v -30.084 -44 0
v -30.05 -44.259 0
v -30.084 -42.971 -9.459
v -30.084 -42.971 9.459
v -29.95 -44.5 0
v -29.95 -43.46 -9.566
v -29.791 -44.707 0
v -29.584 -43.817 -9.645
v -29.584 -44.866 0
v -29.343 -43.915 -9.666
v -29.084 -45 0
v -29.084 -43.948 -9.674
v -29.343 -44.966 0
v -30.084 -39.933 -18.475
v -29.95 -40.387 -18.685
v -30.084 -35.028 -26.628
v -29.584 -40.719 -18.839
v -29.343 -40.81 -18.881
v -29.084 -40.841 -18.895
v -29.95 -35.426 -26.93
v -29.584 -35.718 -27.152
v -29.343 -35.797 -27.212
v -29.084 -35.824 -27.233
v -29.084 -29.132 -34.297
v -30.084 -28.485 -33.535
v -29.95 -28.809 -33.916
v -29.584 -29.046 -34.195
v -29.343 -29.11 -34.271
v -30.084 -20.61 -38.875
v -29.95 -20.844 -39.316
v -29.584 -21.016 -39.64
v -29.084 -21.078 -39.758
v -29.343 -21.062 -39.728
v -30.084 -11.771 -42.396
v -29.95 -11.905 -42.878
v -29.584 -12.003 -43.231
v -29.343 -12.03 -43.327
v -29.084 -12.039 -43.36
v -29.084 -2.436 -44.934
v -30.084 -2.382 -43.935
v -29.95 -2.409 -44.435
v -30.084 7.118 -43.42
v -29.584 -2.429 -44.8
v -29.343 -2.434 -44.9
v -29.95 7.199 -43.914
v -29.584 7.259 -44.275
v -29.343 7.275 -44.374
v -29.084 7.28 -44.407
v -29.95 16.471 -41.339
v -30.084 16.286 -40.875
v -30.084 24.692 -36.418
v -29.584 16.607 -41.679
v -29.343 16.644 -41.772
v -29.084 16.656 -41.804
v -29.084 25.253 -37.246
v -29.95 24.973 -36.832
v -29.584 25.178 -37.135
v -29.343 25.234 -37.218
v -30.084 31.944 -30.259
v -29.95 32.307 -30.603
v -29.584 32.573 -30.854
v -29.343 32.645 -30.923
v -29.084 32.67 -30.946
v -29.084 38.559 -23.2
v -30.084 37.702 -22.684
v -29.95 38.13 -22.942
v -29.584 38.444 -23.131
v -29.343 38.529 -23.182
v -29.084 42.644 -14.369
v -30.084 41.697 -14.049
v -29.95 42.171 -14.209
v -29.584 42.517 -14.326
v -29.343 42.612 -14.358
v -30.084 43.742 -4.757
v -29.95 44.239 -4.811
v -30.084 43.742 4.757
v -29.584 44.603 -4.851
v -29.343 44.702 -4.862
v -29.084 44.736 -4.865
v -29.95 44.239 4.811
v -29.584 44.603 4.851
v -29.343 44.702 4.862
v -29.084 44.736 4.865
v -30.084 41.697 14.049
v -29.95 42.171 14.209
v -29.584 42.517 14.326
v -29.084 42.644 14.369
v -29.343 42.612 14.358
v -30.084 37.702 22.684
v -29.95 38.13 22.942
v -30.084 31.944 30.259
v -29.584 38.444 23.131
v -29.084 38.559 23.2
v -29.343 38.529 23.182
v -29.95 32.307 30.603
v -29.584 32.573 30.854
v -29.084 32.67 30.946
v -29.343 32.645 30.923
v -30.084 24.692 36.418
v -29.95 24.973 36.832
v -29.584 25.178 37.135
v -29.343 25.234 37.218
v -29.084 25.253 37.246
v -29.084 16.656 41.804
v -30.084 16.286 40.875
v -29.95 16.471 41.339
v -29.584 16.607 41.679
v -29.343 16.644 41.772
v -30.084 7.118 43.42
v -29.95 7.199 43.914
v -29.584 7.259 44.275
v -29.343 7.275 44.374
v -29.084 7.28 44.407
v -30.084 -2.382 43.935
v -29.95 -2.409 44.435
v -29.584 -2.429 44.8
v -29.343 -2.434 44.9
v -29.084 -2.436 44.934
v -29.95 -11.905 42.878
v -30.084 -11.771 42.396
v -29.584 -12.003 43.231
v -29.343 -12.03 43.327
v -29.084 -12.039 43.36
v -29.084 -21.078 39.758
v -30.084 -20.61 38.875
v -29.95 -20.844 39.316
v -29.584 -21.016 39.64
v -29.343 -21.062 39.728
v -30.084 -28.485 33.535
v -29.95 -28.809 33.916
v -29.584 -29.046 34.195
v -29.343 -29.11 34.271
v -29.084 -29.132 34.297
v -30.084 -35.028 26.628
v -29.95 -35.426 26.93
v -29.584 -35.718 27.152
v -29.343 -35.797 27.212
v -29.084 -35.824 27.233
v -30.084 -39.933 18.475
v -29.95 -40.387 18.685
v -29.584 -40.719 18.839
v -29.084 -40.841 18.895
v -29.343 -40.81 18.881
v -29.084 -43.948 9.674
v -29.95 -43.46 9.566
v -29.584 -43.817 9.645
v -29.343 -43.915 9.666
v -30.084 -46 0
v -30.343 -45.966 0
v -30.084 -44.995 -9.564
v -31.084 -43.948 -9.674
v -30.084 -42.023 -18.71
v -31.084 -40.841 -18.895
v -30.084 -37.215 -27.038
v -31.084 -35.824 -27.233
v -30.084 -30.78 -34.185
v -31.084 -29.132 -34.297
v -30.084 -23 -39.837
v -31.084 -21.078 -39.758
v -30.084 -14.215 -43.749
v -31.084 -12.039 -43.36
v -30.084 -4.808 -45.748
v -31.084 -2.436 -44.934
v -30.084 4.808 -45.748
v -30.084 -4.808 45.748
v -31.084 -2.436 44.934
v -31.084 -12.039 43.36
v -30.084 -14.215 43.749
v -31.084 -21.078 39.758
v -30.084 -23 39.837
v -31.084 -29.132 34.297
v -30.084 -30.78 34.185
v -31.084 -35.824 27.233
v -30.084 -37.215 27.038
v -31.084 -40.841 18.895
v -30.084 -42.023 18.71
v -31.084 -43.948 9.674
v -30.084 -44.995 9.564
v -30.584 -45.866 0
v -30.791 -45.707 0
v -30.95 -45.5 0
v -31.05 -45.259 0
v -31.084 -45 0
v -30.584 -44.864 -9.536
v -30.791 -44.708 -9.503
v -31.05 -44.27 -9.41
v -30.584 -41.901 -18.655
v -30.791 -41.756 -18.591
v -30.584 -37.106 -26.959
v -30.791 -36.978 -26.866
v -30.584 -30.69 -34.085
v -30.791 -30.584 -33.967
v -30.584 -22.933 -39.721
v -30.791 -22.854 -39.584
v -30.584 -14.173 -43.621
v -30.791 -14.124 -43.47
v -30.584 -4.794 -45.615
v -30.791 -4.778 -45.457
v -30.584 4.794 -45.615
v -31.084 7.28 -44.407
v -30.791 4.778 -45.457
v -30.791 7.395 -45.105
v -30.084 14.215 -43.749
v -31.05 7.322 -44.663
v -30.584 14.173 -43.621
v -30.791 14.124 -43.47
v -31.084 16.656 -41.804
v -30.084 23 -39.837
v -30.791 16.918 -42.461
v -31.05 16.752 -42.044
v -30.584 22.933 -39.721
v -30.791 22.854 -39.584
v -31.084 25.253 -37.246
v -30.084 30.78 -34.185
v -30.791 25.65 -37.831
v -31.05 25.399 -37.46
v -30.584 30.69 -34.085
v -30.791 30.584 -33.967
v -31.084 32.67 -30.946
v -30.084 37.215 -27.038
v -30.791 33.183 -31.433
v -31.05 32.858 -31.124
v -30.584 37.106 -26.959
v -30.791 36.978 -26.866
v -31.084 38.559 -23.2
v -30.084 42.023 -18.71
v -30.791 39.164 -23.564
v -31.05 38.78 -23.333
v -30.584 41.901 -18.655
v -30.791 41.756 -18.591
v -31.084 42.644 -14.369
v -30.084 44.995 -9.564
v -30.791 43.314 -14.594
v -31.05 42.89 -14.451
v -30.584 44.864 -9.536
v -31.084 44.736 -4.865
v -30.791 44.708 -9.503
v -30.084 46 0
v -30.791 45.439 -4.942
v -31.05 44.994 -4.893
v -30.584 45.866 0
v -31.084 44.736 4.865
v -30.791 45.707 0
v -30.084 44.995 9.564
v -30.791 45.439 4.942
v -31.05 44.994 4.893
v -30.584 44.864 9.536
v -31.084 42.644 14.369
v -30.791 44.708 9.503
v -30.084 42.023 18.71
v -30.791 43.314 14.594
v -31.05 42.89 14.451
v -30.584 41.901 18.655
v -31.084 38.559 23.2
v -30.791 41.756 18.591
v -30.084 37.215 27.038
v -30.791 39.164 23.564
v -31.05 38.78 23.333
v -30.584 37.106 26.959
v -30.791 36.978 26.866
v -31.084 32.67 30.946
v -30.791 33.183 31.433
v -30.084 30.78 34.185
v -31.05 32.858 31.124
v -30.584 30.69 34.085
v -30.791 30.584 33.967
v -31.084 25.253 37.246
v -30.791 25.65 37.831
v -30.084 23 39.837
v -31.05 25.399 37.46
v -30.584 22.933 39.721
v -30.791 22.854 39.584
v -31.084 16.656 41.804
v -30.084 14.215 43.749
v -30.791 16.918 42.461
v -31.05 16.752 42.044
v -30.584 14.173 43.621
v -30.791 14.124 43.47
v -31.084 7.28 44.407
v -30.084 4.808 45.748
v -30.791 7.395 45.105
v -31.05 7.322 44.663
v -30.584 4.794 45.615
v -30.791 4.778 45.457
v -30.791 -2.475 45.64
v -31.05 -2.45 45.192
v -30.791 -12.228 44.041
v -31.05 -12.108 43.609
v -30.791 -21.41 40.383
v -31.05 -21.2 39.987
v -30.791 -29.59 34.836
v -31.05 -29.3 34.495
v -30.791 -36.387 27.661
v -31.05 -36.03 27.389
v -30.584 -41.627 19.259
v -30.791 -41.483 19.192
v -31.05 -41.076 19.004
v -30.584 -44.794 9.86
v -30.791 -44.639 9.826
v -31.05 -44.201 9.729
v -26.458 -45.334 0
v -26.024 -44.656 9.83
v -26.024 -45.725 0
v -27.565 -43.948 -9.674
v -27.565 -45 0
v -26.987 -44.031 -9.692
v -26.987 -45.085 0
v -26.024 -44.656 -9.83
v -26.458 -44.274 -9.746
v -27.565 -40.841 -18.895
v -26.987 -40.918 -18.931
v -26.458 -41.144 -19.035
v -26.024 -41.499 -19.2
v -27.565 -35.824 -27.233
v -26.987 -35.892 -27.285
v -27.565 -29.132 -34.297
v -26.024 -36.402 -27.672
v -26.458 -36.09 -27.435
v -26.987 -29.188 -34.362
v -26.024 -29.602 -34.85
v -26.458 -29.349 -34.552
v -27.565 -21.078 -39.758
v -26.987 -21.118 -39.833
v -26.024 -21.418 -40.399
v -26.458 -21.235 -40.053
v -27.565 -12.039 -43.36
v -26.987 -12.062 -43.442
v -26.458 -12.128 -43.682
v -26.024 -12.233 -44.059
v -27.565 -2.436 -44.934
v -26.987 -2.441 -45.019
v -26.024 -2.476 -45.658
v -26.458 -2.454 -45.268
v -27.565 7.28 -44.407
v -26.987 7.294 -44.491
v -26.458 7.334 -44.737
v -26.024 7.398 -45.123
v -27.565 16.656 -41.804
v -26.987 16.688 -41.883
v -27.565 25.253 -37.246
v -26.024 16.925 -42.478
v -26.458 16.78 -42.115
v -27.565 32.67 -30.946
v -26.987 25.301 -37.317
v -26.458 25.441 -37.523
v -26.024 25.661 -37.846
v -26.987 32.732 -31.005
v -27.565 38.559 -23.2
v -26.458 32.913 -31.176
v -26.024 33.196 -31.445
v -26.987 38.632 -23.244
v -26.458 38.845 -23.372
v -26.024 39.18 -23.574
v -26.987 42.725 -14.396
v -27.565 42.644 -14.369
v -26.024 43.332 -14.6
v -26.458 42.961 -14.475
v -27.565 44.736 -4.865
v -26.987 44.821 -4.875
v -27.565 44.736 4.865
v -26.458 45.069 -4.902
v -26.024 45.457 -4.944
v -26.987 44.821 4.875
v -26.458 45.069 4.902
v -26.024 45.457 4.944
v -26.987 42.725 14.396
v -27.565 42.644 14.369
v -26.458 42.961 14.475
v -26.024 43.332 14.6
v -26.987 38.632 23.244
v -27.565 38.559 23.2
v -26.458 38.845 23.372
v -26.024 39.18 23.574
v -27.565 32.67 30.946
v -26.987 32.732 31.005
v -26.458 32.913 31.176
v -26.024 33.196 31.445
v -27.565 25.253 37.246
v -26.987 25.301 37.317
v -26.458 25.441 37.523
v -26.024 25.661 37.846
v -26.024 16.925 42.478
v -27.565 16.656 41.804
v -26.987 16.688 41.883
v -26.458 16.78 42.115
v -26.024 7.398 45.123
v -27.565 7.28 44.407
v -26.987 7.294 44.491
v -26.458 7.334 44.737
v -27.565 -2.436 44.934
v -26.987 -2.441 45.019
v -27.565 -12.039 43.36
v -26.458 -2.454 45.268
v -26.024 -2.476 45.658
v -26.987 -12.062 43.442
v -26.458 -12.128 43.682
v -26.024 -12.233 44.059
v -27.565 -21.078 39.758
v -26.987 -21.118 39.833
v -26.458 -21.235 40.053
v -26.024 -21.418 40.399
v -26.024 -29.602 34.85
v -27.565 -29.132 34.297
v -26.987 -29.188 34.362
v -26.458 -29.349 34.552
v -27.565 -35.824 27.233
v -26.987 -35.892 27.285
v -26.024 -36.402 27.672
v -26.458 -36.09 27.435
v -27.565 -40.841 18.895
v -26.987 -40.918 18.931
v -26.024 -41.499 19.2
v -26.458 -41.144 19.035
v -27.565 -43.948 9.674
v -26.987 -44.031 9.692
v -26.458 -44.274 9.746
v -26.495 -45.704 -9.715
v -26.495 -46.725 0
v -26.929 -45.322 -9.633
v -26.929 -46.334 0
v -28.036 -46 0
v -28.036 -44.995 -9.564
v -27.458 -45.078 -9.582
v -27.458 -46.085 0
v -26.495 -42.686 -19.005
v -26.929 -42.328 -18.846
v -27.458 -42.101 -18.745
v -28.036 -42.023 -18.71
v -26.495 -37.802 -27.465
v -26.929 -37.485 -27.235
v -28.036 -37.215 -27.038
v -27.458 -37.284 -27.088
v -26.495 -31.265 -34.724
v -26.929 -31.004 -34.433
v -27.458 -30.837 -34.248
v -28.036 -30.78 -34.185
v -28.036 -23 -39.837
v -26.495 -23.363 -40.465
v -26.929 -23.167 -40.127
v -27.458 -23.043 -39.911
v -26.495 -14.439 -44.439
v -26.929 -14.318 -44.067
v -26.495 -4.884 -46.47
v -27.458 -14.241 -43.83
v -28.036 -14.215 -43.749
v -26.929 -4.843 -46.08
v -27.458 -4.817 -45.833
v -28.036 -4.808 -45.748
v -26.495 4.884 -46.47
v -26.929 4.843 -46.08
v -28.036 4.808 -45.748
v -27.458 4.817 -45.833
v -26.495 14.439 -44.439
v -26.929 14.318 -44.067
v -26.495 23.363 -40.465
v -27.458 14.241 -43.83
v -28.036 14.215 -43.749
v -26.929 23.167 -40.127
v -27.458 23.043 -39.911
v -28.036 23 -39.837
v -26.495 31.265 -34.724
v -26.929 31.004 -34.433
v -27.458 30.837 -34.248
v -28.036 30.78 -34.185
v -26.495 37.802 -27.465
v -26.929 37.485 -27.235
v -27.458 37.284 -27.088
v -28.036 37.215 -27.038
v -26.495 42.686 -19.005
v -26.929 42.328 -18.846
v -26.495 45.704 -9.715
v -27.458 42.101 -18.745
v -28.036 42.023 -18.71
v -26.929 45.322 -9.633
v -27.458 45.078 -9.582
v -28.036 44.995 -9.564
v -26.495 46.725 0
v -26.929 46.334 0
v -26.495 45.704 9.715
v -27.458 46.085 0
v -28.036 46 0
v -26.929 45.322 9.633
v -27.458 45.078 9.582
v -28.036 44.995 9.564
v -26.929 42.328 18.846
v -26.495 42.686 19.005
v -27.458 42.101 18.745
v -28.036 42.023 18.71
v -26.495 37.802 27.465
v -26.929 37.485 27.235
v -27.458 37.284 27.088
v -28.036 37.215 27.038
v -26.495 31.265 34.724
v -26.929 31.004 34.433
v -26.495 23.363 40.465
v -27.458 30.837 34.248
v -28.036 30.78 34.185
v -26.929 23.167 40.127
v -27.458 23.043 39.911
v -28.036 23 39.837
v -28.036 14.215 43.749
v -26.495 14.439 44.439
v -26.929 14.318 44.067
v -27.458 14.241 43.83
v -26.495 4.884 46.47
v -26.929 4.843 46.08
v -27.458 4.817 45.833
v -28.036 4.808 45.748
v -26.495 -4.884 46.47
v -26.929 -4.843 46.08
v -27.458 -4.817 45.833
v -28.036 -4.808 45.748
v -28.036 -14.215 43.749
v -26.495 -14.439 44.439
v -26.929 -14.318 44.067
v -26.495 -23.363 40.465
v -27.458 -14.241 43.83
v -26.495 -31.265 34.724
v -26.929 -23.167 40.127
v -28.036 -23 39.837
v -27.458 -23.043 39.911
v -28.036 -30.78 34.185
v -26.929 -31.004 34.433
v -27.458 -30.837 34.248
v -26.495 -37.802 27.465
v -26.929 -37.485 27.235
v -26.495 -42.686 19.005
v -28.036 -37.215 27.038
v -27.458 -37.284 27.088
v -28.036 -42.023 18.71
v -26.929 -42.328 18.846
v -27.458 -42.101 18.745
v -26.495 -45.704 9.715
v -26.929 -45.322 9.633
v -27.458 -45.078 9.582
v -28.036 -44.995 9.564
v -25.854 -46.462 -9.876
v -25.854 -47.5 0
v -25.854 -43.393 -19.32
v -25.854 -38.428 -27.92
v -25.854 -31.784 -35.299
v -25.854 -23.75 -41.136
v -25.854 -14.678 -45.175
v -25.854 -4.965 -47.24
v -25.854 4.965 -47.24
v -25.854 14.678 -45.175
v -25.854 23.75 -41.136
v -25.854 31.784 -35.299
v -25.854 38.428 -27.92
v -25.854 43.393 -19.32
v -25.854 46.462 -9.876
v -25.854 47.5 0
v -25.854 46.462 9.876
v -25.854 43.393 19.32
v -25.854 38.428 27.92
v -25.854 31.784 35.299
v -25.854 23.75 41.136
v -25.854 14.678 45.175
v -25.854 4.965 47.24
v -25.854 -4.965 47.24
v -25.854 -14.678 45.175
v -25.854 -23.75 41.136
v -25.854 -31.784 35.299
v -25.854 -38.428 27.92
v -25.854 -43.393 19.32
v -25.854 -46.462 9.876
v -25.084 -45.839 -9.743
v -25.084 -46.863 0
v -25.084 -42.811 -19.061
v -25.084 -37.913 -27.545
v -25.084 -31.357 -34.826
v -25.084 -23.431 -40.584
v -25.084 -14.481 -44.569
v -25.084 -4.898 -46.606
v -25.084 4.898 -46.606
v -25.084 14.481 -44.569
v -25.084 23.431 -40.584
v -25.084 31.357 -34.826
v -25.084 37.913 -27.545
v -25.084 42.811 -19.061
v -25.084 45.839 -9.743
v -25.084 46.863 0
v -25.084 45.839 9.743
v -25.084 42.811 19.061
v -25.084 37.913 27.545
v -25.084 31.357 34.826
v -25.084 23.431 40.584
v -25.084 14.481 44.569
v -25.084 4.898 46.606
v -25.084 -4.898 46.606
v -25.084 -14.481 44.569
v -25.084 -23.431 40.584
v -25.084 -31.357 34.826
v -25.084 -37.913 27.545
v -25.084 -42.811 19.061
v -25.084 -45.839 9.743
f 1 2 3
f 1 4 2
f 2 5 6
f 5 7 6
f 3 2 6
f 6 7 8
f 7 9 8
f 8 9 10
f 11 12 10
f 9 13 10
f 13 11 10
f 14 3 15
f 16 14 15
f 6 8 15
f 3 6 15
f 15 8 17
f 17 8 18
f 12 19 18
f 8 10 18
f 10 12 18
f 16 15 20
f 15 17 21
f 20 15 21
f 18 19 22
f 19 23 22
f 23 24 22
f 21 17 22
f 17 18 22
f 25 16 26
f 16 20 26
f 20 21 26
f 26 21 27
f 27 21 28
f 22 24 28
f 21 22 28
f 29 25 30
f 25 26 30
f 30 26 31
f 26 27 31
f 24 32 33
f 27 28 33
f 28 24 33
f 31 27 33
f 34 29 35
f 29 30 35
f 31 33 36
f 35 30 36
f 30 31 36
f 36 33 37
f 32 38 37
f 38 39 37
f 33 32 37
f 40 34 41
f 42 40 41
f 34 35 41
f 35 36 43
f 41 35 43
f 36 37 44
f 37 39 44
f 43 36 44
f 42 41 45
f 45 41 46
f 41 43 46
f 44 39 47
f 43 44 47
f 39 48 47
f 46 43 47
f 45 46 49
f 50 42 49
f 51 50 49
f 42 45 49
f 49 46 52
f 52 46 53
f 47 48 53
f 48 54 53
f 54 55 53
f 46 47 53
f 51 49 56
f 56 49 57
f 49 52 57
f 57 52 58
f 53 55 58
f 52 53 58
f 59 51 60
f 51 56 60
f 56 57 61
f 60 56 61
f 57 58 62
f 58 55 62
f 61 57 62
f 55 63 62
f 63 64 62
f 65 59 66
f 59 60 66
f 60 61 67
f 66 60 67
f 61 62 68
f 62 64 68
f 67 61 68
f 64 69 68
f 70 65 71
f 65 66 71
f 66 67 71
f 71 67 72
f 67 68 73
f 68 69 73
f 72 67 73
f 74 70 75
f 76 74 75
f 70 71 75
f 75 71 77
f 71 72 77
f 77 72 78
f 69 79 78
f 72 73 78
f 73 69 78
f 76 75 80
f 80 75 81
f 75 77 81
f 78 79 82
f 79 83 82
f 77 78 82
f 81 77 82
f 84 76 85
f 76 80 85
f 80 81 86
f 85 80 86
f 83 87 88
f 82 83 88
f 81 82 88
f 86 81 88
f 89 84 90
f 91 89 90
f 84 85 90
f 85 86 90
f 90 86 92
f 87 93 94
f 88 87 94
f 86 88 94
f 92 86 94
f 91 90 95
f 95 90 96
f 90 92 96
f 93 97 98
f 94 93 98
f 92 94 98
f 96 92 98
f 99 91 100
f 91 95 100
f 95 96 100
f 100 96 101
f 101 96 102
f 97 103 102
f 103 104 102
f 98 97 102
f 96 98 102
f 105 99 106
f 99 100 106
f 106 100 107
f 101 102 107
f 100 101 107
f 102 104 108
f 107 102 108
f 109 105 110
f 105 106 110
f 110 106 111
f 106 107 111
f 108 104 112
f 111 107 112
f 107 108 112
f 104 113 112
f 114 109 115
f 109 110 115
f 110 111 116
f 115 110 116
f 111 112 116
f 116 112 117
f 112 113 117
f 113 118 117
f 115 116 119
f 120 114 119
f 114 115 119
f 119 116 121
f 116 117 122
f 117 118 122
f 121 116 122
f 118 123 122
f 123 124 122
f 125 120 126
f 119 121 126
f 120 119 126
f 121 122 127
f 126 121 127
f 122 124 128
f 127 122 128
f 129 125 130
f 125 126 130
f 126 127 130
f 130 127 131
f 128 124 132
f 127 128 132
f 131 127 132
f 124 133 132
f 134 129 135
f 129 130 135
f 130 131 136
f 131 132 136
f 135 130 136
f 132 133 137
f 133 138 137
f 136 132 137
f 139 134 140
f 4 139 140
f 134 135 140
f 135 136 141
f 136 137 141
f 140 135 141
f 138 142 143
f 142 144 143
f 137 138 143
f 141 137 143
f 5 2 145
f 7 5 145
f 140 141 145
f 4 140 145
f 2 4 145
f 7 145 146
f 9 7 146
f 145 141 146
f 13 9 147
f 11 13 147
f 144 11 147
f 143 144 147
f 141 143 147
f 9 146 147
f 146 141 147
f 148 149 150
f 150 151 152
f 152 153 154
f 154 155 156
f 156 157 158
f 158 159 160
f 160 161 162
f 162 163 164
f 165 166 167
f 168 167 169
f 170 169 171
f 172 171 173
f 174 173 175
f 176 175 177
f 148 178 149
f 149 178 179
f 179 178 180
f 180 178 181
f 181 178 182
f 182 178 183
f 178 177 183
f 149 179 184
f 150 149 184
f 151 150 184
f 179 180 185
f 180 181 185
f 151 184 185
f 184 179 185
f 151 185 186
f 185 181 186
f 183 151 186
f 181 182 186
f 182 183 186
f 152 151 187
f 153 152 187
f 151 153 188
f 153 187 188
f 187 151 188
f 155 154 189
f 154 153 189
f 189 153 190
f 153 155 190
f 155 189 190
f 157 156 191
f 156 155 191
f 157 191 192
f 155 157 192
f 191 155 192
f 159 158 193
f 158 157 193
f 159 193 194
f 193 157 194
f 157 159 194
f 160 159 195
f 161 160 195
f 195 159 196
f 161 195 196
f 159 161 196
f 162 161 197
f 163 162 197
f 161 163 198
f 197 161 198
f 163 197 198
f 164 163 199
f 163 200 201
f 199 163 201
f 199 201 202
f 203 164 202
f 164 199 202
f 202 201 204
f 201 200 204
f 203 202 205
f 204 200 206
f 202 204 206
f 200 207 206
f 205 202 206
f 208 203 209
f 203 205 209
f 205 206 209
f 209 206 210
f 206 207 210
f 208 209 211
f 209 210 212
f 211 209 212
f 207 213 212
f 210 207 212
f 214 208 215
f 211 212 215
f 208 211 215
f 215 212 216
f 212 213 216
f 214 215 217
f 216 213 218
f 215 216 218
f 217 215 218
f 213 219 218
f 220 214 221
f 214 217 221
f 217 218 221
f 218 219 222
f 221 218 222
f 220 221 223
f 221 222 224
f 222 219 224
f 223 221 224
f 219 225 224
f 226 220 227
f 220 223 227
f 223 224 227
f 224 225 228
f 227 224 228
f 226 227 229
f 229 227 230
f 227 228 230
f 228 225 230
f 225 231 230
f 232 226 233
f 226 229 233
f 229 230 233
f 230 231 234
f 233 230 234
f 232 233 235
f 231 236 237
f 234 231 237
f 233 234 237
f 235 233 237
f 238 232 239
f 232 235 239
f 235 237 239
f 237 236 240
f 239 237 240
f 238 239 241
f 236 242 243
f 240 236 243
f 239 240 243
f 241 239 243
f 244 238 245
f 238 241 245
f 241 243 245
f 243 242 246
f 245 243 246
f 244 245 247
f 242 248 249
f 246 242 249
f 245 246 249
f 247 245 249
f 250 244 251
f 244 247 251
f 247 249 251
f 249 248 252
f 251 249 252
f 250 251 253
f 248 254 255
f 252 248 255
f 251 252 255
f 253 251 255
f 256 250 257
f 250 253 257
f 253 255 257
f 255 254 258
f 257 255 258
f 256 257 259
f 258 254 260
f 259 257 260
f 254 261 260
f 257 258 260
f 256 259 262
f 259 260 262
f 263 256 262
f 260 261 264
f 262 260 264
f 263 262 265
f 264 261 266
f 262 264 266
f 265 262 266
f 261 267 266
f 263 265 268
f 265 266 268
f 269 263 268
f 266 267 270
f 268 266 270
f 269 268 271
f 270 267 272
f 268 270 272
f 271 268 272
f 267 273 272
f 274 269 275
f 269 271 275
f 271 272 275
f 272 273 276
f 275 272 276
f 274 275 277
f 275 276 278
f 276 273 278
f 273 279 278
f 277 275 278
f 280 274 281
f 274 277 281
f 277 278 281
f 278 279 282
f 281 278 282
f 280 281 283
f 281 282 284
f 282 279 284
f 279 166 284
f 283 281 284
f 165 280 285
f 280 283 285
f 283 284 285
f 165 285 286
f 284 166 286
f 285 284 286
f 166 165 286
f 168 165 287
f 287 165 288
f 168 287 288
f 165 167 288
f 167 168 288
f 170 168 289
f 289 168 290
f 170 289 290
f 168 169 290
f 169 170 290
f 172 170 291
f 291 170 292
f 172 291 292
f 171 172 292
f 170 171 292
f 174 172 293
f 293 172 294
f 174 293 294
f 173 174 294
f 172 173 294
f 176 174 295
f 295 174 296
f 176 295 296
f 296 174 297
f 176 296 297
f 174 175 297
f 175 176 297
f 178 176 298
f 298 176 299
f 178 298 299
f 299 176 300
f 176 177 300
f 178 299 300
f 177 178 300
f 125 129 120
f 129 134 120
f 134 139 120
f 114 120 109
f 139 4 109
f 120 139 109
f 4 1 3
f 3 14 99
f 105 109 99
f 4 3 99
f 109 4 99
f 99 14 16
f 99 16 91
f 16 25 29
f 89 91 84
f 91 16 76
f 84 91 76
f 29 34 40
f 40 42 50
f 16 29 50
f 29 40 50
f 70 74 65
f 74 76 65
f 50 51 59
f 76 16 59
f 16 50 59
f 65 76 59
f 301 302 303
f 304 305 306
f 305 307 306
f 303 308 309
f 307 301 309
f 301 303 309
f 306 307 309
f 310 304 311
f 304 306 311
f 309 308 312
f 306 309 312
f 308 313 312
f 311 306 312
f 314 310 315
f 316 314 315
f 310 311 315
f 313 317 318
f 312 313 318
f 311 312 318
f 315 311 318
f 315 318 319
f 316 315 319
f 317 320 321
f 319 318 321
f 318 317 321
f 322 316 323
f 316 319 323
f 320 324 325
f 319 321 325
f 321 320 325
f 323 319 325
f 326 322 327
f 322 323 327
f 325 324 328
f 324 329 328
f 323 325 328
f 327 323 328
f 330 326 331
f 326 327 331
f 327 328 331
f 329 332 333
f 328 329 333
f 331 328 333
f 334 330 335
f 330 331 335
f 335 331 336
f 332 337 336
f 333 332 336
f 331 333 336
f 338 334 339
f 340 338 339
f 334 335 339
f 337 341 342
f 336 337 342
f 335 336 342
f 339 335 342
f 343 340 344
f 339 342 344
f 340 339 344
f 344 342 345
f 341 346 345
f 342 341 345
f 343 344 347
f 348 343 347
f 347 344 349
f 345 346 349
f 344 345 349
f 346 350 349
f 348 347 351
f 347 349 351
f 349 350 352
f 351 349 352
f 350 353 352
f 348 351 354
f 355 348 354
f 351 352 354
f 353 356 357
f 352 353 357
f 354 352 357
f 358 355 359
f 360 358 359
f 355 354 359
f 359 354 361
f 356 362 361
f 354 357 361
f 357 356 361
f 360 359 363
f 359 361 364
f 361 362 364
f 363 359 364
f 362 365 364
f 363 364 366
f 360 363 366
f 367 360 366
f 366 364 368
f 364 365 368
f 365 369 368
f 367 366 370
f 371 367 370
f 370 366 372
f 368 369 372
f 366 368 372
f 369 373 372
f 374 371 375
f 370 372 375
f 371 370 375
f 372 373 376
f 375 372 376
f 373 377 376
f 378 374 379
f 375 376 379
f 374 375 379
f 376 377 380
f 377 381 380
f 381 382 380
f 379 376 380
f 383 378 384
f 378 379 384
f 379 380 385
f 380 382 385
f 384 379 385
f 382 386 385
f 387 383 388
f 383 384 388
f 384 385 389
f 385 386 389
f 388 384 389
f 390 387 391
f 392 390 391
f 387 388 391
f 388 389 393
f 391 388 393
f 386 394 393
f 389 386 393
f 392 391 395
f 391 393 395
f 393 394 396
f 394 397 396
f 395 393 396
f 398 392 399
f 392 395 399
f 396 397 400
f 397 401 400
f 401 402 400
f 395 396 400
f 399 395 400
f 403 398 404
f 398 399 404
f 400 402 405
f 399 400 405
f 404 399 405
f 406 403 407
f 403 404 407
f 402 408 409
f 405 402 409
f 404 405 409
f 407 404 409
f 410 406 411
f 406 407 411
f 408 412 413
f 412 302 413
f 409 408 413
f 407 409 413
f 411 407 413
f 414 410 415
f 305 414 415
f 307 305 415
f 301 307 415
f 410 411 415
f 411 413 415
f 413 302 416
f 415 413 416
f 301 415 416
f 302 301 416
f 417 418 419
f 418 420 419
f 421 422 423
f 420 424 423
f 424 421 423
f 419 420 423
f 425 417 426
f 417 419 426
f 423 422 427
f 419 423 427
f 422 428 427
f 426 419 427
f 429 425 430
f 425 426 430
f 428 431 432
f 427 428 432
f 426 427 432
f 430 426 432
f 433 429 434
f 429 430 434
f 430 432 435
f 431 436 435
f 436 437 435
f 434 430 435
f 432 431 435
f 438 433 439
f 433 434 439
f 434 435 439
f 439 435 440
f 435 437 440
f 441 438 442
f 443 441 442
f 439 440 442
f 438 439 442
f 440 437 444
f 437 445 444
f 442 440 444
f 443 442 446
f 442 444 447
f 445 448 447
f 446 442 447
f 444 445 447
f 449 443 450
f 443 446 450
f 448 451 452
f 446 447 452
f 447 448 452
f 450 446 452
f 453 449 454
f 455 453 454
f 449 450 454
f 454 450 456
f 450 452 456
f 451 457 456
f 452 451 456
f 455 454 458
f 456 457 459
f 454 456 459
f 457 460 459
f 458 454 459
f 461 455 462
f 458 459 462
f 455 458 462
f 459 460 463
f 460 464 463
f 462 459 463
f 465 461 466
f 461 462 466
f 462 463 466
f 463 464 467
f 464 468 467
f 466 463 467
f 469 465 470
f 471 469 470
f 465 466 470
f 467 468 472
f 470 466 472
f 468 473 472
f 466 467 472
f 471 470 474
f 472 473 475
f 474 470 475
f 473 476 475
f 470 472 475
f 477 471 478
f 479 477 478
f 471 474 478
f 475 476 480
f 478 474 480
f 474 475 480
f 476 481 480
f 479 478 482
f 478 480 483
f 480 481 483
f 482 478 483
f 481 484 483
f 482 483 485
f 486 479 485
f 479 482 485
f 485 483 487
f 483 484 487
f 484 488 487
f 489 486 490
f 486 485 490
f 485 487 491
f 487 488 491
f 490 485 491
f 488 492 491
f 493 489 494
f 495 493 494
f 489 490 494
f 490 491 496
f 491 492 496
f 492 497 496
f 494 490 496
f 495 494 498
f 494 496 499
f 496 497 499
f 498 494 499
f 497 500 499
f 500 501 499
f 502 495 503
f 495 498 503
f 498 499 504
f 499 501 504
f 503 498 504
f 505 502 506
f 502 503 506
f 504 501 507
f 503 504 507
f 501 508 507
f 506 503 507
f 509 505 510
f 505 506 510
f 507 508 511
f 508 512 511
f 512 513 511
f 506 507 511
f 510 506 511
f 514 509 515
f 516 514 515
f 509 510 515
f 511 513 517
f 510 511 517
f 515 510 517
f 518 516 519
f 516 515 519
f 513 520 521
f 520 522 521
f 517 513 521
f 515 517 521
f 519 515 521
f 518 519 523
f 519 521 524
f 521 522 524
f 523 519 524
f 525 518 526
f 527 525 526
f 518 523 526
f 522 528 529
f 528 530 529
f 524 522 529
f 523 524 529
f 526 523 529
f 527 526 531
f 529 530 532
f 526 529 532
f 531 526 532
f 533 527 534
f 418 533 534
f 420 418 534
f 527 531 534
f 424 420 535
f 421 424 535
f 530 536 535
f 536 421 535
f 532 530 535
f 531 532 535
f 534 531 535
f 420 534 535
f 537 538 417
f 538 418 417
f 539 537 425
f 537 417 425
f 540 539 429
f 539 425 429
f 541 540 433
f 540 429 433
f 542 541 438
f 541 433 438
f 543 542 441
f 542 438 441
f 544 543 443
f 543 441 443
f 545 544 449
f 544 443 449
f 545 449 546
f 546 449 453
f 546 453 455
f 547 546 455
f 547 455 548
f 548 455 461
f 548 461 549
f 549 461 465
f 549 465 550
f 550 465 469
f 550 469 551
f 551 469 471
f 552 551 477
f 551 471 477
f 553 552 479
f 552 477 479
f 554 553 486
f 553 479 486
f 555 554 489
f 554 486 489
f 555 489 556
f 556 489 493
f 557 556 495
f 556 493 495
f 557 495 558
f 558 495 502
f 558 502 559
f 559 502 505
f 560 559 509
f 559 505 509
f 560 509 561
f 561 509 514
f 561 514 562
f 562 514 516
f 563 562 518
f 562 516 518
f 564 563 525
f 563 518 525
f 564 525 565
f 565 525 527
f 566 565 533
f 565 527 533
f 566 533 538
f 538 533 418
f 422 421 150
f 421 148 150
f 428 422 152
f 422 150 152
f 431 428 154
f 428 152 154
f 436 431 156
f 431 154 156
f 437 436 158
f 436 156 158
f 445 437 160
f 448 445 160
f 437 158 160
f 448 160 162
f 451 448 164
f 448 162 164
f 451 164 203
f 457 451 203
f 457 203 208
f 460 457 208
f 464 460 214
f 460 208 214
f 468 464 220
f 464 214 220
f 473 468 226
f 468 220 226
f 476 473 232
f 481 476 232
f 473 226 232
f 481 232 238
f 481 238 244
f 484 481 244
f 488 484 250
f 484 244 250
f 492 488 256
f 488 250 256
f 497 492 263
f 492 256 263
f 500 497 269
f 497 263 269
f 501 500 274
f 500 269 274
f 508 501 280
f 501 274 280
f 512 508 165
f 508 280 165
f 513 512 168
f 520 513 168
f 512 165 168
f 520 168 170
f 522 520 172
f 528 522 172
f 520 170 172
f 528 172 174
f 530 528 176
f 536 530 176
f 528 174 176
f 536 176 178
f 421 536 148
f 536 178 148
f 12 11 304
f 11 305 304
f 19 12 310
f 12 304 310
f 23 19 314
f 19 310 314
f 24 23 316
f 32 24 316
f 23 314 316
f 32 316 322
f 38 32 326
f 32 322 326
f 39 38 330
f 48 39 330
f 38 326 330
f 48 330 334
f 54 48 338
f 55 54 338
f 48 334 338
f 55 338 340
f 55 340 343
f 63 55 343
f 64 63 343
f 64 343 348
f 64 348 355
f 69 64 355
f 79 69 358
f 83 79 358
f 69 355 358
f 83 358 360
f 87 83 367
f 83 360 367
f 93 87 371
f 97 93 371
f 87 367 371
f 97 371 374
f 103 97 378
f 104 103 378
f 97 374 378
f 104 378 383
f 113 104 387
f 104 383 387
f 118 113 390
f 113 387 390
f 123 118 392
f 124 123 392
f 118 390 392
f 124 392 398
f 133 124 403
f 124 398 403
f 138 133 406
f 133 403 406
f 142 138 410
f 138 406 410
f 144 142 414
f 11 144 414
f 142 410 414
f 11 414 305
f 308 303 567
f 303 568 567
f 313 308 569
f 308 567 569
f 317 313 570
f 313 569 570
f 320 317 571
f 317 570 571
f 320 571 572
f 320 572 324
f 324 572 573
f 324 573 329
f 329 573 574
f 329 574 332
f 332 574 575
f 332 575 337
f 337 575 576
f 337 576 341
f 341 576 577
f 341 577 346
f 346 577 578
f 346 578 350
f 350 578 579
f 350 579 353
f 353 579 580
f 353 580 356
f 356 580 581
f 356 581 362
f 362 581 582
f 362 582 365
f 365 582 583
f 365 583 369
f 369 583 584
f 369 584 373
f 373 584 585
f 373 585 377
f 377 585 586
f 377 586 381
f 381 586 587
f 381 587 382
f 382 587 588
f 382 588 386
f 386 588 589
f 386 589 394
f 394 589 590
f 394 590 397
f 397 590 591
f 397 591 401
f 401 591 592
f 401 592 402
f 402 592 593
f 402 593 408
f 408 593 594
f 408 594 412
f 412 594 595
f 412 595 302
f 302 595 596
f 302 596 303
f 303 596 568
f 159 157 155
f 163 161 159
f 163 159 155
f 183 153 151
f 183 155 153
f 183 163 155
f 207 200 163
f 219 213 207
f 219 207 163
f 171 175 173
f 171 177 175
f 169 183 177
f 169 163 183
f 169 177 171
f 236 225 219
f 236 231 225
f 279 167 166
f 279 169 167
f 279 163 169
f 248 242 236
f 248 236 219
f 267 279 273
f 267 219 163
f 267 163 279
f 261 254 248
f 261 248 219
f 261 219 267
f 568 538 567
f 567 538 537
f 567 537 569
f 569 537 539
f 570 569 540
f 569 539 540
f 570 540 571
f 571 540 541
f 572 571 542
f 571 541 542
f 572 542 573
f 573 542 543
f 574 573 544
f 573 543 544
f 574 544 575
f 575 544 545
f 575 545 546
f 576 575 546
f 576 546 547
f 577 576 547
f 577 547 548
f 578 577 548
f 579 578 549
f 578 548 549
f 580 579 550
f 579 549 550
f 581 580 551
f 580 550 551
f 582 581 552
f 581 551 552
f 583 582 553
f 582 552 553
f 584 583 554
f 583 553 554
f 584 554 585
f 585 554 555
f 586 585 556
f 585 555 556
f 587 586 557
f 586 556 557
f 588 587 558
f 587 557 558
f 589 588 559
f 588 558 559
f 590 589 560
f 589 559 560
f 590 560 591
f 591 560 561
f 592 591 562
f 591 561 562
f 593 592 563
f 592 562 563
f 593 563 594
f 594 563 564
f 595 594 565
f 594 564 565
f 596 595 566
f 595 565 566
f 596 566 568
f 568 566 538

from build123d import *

# Parameters (mm, degrees)
SKETCH_2_R          = 36.366400699
CUT_EXTRUDE_1_DEPTH = 16
SKETCH_3_R          = 34.490812752
EXTRUDE_1_DEPTH     = 1


with BuildPart() as part:
    # 草图1 → 旋转1 (revolve)
    with BuildSketch(Plane.XY):
        with BuildLine():
            Line((-38.083747267, -28.5), (-32.083747267, -28.5))
            ThreePointArc((-32.083747267, -28.5), (-30.669533704, -29.085786438), (-30.083747267, -30.5))
            Line((-30.083747267, -30.5), (-30.083747267, -44))
            ThreePointArc((-30.083747267, -44), (-29.790854048, -44.707106781), (-29.083747267, -45))
            Line((-29.083747267, -45), (-27.565467955, -45))
            ThreePointArc((-27.565467955, -45), (-26.713721936, -45.190434107), (-26.02417741, -45.72547128))
            Line((-26.02417741, -45.72547128), (-25.083747267, -46.86273564))
            Line((-25.083747267, -46.86273564), (-25.854392539, -47.5))
            Line((-25.854392539, -47.5), (-26.494868211, -46.72547128))
            ThreePointArc((-26.494868211, -46.72547128), (-27.184412737, -46.190434107), (-28.036158755, -46))
            Line((-28.036158755, -46), (-30.083747267, -46))
            ThreePointArc((-30.083747267, -46), (-30.790854048, -45.707106781), (-31.083747267, -45))
            Line((-31.083747267, -45), (-31.083747267, -31.5))
            ThreePointArc((-31.083747267, -31.5), (-31.669533704, -30.085786438), (-33.083747267, -29.5))
            Line((-33.083747267, -29.5), (-37.083747267, -29.5))
            ThreePointArc((-37.083747267, -29.5), (-37.790854048, -29.207106781), (-38.083747267, -28.5))
        make_face()
    revolve(axis=Axis((-28.083747267, 0, 0), (1, 0, 0)))

    # 草图2 → 切除-拉伸1 (cut)
    with BuildSketch(Plane.ZY.offset(31.083747267)):
        Circle(SKETCH_2_R)
    extrude(amount=CUT_EXTRUDE_1_DEPTH, mode=Mode.SUBTRACT)

    # 草图3 → 凸台-拉伸1 (add)
    with BuildSketch(Plane.ZY.offset(31.083747267)):
        Circle(SKETCH_3_R)
    extrude(amount=-EXTRUDE_1_DEPTH)


solid = part.part
